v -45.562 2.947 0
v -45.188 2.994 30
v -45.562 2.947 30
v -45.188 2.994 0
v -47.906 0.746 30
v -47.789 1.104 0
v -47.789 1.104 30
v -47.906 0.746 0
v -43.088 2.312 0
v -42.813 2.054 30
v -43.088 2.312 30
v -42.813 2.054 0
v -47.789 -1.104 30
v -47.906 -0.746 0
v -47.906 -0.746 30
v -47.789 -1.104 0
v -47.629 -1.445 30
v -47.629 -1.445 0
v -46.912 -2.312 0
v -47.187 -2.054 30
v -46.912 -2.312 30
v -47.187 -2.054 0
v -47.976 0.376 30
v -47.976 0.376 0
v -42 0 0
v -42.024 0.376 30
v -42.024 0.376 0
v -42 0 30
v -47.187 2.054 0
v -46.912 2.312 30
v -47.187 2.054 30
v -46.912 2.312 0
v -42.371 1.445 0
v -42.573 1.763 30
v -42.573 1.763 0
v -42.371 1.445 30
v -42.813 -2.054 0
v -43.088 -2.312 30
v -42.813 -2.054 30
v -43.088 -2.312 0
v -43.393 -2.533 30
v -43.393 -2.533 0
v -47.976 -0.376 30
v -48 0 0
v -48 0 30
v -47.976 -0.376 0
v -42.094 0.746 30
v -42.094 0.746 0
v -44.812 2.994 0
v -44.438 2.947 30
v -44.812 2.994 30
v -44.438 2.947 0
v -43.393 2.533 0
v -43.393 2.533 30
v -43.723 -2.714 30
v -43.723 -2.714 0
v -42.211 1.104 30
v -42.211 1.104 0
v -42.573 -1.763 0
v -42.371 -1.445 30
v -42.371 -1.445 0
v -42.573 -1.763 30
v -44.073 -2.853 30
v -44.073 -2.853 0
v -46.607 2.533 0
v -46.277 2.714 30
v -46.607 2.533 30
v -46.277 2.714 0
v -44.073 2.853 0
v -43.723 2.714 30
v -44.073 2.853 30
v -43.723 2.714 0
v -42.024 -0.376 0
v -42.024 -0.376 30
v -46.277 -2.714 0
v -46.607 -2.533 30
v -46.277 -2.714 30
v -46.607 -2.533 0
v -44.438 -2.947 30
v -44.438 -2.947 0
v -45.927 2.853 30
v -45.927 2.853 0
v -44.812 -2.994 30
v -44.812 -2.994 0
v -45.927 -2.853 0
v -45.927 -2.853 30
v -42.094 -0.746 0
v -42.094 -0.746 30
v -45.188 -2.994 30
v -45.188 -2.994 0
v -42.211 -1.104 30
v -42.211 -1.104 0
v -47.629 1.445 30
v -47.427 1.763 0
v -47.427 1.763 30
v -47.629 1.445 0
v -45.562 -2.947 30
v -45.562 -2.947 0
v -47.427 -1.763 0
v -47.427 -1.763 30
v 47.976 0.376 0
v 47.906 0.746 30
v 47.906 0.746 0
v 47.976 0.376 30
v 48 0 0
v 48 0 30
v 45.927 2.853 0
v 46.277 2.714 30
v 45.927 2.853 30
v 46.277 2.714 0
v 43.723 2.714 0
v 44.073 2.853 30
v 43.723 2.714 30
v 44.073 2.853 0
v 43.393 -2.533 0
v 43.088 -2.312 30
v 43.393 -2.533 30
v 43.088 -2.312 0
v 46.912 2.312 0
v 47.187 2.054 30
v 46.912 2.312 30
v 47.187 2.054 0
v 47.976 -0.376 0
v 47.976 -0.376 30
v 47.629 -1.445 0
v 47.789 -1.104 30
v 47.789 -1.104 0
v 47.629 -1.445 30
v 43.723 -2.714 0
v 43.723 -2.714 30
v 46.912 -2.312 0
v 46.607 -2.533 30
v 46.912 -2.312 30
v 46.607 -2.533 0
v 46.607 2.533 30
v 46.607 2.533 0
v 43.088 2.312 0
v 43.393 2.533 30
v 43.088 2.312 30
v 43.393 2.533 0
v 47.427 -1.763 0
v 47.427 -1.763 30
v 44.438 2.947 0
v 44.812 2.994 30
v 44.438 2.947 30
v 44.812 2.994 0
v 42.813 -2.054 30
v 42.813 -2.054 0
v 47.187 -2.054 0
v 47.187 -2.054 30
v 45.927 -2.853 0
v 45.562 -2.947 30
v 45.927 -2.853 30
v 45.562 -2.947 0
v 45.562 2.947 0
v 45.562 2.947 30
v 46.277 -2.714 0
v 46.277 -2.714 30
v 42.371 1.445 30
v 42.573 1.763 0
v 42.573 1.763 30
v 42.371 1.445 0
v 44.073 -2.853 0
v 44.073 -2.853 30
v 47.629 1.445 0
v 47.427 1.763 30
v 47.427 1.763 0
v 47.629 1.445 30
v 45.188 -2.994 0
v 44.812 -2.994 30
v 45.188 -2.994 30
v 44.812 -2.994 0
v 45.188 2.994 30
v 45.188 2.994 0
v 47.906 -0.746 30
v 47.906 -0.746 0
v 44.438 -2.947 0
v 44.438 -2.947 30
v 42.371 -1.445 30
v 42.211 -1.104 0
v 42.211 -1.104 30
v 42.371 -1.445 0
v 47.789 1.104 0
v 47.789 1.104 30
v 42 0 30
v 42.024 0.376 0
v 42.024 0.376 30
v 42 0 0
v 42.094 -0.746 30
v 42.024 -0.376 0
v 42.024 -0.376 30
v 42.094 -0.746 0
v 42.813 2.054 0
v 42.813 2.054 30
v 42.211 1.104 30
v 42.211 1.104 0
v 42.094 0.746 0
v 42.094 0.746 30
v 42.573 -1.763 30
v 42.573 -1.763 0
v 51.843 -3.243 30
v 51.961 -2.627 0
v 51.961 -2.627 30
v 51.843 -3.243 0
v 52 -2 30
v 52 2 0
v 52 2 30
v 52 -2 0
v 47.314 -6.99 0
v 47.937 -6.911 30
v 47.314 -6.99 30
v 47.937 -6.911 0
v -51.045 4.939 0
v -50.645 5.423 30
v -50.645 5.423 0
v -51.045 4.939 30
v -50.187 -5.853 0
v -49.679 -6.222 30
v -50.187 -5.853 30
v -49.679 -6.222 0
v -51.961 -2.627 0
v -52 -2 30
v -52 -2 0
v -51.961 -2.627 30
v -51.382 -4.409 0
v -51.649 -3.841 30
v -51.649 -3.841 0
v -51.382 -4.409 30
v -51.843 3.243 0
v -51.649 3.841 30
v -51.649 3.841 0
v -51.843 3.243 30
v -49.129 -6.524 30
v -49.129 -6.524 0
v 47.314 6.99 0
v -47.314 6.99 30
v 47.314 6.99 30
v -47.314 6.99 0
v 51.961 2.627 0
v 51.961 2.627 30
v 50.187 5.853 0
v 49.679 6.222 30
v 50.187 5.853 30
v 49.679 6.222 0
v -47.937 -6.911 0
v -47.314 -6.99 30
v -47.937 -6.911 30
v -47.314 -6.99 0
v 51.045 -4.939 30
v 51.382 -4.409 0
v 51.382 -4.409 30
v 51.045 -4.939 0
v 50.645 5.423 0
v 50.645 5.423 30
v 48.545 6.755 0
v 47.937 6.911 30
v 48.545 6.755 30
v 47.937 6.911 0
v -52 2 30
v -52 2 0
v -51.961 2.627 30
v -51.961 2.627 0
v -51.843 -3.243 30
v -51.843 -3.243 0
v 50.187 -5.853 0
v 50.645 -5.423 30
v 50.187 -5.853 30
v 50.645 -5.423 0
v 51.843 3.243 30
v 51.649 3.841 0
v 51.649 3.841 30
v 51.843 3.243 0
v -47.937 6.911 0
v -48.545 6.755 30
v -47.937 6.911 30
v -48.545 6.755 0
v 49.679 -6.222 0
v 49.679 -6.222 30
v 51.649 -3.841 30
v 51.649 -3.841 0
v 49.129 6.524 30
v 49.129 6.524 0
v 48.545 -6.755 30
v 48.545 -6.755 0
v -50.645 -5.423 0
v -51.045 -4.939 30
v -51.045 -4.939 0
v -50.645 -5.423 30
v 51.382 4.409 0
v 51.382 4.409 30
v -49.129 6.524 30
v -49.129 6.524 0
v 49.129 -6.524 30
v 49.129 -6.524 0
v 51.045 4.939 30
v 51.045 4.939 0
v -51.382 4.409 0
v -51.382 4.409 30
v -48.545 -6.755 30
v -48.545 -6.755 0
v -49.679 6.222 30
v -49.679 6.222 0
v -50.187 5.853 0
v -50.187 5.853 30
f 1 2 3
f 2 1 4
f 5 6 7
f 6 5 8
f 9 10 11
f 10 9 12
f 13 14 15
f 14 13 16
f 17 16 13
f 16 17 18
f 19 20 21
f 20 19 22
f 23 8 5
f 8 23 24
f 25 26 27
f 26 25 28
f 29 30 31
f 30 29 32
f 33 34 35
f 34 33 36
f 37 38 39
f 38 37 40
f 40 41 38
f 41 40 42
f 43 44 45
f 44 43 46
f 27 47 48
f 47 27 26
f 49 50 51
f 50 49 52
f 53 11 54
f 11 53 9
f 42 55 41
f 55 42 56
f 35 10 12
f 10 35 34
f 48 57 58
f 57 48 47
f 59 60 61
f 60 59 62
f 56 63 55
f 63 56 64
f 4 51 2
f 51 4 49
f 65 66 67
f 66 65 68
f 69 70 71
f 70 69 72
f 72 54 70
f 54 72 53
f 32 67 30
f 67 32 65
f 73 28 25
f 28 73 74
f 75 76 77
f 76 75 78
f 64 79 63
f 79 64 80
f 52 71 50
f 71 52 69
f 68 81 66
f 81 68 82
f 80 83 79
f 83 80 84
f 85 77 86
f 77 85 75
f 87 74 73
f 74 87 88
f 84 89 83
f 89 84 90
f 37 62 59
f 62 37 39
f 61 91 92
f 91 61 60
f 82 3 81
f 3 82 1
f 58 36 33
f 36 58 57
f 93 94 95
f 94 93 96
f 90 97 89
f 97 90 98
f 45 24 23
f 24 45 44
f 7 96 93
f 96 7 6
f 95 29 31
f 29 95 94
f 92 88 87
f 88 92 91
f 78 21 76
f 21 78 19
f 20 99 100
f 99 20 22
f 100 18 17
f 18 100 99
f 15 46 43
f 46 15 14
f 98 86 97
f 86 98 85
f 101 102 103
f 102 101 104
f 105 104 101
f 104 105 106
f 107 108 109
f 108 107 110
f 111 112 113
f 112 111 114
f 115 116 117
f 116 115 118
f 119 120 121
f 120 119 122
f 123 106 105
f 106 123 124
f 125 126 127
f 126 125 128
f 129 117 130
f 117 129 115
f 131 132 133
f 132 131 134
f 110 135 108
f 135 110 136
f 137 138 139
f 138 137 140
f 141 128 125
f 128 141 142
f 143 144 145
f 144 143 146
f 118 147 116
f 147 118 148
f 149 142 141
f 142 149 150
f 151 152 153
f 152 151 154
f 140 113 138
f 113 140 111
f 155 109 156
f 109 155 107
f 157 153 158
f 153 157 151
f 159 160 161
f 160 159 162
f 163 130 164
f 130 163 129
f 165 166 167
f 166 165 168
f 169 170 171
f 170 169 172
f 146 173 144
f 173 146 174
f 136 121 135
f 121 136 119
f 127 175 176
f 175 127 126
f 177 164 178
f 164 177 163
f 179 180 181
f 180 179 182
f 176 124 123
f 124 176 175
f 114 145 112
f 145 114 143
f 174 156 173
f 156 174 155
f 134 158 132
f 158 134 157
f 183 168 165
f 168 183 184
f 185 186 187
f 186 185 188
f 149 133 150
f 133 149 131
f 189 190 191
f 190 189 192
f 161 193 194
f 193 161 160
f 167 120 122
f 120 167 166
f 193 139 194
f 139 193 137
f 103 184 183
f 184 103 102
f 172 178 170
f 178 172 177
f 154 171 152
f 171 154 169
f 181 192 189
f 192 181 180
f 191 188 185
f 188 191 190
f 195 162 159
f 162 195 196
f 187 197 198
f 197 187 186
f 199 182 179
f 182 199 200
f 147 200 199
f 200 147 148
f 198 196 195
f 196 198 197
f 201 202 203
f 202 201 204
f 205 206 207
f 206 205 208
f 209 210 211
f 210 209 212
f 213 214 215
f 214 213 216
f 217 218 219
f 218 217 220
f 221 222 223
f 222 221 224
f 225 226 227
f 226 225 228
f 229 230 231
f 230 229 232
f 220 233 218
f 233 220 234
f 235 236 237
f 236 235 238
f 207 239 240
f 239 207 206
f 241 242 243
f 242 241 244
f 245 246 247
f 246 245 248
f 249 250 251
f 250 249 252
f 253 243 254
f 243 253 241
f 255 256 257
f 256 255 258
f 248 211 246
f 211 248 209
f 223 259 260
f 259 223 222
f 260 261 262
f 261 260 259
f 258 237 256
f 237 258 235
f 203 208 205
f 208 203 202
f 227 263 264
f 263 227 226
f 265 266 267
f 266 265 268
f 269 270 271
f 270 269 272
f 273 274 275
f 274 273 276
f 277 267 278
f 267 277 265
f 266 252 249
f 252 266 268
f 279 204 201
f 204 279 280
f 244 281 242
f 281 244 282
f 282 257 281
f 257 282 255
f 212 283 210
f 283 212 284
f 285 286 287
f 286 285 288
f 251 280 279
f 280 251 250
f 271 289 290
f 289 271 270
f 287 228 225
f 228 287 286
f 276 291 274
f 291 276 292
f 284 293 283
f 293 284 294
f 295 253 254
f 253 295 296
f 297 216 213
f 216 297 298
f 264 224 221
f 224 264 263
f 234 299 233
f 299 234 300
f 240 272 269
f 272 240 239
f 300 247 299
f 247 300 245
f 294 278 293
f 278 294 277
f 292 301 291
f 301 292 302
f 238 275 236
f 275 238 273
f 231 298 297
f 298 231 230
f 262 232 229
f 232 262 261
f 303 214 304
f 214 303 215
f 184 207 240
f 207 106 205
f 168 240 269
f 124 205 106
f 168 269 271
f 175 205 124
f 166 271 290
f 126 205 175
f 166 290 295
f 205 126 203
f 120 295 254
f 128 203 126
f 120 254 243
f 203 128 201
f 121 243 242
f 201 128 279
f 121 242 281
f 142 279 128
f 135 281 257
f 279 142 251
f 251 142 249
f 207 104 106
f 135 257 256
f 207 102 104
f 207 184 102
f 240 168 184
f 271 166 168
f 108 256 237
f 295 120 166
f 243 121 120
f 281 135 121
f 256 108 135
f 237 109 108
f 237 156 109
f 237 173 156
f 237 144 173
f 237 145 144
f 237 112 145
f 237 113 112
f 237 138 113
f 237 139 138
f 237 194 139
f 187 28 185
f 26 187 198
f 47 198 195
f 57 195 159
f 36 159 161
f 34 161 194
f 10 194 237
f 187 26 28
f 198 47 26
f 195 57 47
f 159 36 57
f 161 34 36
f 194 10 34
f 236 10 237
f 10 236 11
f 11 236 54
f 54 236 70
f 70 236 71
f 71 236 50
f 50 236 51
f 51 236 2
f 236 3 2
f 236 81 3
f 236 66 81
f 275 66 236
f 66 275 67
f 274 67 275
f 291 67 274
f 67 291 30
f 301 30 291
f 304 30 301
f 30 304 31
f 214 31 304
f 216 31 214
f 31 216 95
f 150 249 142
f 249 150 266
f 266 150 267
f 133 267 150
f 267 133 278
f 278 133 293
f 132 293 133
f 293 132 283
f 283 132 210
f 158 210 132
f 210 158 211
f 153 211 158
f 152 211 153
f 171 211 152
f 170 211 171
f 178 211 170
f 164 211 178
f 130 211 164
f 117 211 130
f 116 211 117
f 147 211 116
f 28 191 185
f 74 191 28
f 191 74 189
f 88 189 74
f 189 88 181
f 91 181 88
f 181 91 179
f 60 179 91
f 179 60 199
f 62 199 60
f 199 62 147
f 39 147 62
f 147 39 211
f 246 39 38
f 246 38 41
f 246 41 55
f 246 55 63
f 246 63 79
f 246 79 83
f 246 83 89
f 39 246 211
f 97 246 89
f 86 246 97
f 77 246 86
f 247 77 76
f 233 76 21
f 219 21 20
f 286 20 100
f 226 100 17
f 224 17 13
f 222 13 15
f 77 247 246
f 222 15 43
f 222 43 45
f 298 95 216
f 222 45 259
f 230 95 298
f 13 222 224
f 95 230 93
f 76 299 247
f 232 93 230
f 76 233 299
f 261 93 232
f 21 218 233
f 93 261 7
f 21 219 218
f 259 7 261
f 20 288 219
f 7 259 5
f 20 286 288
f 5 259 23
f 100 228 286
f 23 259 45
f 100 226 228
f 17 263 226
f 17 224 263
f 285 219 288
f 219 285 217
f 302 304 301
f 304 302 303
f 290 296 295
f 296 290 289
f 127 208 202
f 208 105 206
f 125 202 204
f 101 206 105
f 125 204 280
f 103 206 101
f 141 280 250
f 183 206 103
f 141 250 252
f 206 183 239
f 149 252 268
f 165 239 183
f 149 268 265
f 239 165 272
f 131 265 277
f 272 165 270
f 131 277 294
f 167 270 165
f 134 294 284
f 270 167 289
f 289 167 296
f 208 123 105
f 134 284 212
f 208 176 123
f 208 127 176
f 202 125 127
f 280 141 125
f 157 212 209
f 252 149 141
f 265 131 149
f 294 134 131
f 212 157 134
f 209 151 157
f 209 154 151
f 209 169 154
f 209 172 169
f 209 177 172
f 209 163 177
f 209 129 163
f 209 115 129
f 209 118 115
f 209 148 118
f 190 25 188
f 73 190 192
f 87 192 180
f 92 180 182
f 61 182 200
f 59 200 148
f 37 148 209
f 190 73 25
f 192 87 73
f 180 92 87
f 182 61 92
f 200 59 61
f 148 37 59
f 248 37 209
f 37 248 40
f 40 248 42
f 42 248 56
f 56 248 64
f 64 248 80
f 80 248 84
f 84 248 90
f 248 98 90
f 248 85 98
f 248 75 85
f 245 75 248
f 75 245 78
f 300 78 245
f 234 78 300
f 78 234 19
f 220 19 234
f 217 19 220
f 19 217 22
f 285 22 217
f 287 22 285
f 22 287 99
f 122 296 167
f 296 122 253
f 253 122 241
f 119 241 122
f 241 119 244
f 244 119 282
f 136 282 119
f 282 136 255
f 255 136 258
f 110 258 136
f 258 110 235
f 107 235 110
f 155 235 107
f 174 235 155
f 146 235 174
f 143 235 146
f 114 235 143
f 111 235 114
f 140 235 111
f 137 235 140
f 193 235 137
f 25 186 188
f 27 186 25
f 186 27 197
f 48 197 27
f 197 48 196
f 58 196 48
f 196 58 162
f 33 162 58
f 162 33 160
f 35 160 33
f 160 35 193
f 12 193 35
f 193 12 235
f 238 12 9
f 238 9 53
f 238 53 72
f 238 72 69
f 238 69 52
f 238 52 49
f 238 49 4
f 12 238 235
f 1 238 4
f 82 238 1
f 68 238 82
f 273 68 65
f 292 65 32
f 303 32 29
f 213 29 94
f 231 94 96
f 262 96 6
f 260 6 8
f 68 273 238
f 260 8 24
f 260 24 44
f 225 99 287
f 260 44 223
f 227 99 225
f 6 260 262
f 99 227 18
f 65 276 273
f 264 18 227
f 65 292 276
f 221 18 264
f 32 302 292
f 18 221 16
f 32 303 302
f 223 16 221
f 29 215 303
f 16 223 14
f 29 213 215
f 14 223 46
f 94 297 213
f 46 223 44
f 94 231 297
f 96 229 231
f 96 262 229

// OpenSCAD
$fn = 50;


difference() {
	union() {
		hull() {
			translate(v = [-47.0000000000, 2.0000000000, 0]) {
				cylinder(h = 30, r = 5);
			}
			translate(v = [47.0000000000, 2.0000000000, 0]) {
				cylinder(h = 30, r = 5);
			}
			translate(v = [-47.0000000000, -2.0000000000, 0]) {
				cylinder(h = 30, r = 5);
			}
			translate(v = [47.0000000000, -2.0000000000, 0]) {
				cylinder(h = 30, r = 5);
			}
		}
	}
	union() {
		translate(v = [-45.0000000000, 0.0000000000, -100.0000000000]) {
			cylinder(h = 200, r = 3.0000000000);
		}
		translate(v = [-45.0000000000, 0.0000000000, -100.0000000000]) {
			cylinder(h = 200, r = 3.0000000000);
		}
		translate(v = [45.0000000000, 0.0000000000, -100.0000000000]) {
			cylinder(h = 200, r = 3.0000000000);
		}
		translate(v = [45.0000000000, 0.0000000000, -100.0000000000]) {
			cylinder(h = 200, r = 3.0000000000);
		}
	}
}
